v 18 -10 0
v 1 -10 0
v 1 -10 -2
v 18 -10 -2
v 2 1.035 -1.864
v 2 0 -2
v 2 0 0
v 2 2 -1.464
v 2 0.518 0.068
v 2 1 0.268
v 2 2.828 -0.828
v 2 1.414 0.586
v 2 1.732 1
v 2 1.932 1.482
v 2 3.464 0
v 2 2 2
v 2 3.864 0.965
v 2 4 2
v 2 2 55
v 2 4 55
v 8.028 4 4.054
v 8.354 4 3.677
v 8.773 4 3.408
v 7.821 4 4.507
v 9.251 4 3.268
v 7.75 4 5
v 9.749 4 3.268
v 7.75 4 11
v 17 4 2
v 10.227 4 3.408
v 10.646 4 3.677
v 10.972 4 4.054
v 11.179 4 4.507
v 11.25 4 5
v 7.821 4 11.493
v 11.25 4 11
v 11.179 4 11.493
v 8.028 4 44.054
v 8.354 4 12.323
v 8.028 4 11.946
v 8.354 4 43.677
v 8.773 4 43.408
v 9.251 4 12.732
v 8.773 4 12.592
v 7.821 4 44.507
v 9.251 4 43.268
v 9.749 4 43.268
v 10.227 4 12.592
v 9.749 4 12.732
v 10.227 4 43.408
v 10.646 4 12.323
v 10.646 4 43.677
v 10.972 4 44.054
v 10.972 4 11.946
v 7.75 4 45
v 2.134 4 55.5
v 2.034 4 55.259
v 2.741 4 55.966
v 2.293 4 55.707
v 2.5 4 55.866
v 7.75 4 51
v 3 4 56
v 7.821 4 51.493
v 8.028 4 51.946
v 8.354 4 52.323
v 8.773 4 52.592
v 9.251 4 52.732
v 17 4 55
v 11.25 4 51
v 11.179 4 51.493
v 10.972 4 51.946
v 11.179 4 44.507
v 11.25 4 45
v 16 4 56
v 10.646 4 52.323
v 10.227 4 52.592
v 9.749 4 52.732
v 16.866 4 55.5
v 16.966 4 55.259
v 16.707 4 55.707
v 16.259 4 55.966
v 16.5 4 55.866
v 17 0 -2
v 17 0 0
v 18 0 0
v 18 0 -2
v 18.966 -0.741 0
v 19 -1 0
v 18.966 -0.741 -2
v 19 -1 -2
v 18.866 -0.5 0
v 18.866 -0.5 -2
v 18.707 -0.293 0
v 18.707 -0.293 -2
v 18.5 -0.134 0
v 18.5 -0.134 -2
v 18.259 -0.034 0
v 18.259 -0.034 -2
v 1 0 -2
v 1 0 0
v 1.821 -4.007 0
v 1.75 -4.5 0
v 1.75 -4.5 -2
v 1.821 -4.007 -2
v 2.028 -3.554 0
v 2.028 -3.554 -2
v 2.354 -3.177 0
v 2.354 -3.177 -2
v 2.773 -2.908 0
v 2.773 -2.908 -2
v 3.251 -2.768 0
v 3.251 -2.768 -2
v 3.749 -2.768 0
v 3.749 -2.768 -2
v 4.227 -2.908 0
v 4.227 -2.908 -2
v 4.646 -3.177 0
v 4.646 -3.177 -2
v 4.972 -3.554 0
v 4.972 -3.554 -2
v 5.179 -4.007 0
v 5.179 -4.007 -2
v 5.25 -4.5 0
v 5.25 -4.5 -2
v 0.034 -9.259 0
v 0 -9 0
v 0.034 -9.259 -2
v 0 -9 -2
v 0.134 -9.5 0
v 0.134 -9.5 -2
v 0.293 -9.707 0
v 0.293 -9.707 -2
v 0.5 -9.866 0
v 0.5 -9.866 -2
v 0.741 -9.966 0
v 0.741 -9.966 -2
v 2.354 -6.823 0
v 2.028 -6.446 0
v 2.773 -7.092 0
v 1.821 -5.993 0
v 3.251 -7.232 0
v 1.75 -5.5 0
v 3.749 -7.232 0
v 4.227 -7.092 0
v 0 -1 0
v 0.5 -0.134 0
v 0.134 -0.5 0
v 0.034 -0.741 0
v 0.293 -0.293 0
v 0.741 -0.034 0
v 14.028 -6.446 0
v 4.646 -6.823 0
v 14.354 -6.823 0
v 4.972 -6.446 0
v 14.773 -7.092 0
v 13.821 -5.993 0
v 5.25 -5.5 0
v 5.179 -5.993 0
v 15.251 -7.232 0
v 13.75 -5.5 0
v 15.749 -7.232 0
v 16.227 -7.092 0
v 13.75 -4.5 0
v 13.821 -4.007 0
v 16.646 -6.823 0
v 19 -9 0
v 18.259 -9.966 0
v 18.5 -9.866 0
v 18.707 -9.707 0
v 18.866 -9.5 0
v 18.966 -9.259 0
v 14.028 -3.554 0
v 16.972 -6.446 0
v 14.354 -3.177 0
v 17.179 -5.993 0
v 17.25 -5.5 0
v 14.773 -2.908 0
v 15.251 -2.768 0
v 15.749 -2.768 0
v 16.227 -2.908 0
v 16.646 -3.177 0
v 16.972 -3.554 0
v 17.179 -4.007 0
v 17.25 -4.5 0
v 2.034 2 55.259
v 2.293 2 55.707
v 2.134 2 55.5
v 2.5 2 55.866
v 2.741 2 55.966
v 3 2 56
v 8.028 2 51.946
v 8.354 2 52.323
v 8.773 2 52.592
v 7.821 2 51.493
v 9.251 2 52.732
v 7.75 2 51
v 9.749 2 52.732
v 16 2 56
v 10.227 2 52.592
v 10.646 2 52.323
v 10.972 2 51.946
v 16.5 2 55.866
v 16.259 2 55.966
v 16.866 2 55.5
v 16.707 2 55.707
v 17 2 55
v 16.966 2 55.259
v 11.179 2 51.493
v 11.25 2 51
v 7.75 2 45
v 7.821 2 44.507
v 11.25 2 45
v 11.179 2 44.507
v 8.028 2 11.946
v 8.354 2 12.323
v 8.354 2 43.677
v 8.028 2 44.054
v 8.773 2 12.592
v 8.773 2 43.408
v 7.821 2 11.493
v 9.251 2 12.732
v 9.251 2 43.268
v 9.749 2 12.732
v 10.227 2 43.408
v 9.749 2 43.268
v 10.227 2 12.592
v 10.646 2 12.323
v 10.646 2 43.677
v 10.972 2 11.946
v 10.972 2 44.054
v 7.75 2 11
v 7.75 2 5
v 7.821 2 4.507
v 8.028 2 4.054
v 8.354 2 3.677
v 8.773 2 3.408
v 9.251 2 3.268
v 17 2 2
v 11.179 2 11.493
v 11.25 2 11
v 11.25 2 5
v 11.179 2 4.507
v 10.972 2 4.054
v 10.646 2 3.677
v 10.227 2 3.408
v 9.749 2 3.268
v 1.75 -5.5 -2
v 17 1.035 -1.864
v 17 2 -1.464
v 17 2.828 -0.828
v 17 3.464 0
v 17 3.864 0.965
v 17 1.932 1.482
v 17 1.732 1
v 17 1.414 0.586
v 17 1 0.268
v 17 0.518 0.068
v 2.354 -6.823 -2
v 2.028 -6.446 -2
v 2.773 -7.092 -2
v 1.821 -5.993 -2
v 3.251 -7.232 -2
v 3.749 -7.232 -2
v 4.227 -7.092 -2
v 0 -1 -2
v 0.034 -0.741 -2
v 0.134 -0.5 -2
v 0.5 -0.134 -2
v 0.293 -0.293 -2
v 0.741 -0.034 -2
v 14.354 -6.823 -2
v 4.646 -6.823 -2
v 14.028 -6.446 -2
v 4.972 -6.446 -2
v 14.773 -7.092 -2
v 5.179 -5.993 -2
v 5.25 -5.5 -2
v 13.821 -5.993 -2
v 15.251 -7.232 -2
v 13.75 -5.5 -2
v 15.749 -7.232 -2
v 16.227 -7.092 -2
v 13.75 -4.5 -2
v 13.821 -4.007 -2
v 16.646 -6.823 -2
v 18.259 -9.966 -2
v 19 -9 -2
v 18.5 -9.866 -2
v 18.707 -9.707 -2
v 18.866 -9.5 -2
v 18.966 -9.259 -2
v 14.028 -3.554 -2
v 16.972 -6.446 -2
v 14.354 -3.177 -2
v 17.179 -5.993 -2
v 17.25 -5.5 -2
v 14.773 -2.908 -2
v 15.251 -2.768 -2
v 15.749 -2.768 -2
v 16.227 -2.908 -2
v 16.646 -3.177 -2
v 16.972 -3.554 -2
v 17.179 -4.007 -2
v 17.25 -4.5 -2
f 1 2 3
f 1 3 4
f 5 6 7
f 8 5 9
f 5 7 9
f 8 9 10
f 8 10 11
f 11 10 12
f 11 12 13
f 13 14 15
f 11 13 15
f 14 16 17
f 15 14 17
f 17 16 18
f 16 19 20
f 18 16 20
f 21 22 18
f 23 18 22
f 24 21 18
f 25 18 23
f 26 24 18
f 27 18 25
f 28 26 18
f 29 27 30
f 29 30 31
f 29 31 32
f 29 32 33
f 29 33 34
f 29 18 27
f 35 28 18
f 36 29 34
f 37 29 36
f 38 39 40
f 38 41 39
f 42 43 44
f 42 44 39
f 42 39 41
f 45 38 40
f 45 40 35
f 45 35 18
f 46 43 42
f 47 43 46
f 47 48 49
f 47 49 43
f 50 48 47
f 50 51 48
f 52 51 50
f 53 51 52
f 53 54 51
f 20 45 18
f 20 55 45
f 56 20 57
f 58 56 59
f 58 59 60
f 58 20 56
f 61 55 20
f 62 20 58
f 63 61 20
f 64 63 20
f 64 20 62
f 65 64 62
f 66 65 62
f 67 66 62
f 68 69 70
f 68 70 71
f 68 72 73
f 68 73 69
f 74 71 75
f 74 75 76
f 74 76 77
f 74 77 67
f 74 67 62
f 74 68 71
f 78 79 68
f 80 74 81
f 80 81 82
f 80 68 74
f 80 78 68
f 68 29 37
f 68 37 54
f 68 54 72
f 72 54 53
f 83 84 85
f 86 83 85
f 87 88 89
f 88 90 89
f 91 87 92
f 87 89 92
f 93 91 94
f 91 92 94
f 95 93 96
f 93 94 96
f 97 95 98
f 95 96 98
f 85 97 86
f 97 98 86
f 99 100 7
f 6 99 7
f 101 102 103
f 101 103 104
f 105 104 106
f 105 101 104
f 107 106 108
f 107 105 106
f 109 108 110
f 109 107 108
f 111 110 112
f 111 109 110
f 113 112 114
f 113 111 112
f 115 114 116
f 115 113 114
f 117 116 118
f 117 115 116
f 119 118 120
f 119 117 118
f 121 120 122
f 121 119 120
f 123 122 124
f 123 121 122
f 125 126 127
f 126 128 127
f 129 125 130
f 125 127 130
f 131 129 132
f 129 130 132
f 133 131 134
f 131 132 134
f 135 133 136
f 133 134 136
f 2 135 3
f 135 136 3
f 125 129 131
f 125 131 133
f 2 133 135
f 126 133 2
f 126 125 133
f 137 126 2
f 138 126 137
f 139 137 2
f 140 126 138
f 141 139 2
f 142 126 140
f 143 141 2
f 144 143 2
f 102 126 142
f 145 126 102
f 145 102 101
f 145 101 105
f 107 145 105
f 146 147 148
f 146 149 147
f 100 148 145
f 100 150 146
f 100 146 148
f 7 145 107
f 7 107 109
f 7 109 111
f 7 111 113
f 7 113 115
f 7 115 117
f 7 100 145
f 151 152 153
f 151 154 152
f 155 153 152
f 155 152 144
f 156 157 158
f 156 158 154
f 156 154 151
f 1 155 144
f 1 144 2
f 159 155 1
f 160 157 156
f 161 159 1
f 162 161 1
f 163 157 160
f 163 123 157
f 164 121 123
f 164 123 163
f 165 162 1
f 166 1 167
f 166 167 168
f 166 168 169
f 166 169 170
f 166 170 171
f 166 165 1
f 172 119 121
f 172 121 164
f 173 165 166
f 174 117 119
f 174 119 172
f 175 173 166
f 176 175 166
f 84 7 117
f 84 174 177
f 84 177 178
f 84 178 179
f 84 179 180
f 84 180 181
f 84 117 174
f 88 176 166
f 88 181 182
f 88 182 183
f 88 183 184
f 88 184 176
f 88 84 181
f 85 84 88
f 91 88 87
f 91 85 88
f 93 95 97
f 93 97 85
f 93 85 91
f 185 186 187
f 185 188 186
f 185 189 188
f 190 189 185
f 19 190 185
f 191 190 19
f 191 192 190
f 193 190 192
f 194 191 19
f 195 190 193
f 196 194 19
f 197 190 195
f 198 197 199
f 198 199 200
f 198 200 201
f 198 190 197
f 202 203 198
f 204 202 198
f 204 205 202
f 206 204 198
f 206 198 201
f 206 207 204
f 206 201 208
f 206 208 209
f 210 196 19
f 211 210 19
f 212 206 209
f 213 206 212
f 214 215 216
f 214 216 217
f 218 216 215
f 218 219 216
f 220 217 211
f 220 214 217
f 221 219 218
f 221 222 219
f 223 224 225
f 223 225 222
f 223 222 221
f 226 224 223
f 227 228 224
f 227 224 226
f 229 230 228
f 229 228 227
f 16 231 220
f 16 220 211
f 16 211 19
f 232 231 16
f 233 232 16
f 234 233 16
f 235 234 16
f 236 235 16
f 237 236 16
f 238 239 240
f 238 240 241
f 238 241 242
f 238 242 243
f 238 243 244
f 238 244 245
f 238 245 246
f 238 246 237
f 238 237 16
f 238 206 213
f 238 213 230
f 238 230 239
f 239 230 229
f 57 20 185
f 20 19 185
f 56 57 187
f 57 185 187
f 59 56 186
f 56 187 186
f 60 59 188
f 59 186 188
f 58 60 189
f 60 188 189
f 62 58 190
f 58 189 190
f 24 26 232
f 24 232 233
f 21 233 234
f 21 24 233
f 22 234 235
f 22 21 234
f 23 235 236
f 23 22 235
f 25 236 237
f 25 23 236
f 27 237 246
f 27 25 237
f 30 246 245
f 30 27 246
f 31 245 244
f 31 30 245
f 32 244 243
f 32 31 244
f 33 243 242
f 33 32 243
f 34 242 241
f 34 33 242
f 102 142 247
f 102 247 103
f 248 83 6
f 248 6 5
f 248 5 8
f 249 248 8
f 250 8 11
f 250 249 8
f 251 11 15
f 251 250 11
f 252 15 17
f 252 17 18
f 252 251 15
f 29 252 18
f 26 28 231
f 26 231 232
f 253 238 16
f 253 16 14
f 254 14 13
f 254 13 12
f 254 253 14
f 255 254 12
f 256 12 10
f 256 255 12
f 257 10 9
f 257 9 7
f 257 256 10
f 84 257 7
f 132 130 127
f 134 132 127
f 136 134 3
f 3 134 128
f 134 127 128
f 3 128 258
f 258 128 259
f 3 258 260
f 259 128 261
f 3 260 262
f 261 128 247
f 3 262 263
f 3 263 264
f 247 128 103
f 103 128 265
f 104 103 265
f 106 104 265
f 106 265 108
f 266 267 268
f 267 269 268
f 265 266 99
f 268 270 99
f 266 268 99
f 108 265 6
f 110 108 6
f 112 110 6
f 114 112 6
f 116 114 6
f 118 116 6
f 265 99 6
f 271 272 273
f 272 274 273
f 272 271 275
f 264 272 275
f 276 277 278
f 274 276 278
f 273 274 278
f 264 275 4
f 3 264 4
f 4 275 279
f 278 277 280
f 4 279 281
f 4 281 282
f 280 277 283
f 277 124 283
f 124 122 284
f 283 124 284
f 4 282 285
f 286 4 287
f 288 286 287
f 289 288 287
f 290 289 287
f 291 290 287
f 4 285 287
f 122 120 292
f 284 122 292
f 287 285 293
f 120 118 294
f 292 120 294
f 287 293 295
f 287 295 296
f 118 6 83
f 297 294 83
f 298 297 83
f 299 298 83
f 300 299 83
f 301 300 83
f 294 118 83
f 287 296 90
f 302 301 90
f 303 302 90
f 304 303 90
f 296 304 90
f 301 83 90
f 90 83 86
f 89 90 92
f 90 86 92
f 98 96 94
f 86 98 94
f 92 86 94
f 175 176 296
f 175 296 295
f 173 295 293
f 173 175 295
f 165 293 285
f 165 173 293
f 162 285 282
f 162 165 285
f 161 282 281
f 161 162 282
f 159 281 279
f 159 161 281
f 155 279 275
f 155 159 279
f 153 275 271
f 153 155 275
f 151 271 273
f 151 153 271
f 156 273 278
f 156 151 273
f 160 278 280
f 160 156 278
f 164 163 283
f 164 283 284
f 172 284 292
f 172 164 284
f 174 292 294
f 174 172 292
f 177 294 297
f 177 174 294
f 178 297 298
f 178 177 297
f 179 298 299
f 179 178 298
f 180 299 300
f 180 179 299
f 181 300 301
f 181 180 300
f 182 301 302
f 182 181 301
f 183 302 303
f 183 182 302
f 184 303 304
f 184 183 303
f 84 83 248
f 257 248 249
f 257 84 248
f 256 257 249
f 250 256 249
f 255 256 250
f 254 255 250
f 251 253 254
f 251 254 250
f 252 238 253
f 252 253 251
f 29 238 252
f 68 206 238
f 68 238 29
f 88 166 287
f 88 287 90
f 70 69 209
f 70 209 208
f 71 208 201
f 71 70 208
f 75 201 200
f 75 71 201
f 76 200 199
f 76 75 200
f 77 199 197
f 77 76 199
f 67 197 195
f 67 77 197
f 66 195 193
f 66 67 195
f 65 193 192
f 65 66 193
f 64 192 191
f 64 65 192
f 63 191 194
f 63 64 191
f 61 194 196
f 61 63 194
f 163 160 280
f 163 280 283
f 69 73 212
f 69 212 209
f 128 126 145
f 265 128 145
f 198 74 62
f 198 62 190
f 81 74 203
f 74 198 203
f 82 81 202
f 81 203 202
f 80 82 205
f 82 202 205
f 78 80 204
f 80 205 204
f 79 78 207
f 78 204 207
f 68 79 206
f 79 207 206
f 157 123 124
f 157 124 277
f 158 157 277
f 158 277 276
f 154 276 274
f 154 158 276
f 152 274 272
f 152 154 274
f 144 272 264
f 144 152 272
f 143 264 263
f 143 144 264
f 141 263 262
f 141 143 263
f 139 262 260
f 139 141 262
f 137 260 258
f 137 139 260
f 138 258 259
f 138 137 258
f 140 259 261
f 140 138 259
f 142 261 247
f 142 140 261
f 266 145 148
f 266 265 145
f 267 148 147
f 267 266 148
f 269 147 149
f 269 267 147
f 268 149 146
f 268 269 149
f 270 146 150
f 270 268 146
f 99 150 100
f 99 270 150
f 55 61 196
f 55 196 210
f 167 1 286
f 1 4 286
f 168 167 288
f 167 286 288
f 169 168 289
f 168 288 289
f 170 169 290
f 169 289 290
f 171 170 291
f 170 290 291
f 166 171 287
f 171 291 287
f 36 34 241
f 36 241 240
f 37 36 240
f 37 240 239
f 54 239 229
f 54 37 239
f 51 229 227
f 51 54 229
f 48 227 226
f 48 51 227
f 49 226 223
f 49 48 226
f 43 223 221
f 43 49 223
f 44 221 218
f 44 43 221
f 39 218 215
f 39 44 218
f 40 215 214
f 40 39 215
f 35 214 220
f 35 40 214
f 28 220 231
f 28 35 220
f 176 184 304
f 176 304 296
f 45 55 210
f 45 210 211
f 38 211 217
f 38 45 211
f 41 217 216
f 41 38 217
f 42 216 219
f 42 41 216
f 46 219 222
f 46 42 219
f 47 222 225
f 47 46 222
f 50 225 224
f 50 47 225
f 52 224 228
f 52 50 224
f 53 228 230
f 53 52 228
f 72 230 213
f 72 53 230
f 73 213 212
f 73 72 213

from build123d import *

# Parameters (mm, degrees)
CROQUIS1_W             = 19
CROQUIS1_H             = 10
BRIDA_BASE1_DEPTH      = 2
BRIDA_DE_ARISTA1_DEPTH = 15
CORTAR_EXTRUIR1_REACH  = 62.77
REDONDEO1_R            = 1


# Sheet-metal steps are written as plain solids
with BuildPart() as part:
    # Croquis1 → Brida base1 (new body)
    with BuildSketch(Plane.XY):
        with Locations((9.5, -5)):
            Rectangle(CROQUIS1_W, CROQUIS1_H)
        with BuildLine():
            Line((5.25, -4.5), (5.25, -5.5))
            ThreePointArc((5.25, -5.5), (3.5, -7.25), (1.75, -5.5))
            Line((1.75, -5.5), (1.75, -4.5))
            ThreePointArc((1.75, -4.5), (3.5, -2.75), (5.25, -4.5))
        make_face(mode=Mode.SUBTRACT)
        with BuildLine():
            Line((17.25, -4.5), (17.25, -5.5))
            ThreePointArc((17.25, -5.5), (15.5, -7.25), (13.75, -5.5))
            Line((13.75, -5.5), (13.75, -4.5))
            ThreePointArc((13.75, -4.5), (15.5, -2.75), (17.25, -4.5))
        make_face(mode=Mode.SUBTRACT)
    extrude(amount=-BRIDA_BASE1_DEPTH)

    # Brida de arista1 section (across the edge) → Brida de arista1 (add)
    with BuildSketch(Plane(origin=(17, 2, 0), x_dir=(0, -1, 0), z_dir=(-1, 0, 0))):
        with BuildLine():
            Line((-2, 2), (-2, 56))
            Line((-2, 56), (0, 56))
            Line((0, 56), (0, 2))
            ThreePointArc((0, 2), (0.585786438, 0.585786438), (2, 0))
            Line((2, 0), (2, -2))
            ThreePointArc((2, -2), (-0.828427125, -0.828427125), (-2, 2))
        make_face()
    extrude(amount=BRIDA_DE_ARISTA1_DEPTH)

    # Croquis9 → Cortar-Extruir1 (cut, up to next)
    with BuildSketch(Plane(origin=(0, 4, 0), x_dir=(1, 0, 0), z_dir=(0, 1, 0)), mode=Mode.PRIVATE) as cortar_extruir1_sk1:
        with BuildLine():
            Line((7.75, -11), (7.75, -5))
            ThreePointArc((7.75, -5), (9.5, -3.25), (11.25, -5))
            Line((11.25, -5), (11.25, -11))
            ThreePointArc((11.25, -11), (9.5, -12.75), (7.75, -11))
        make_face()
    cortar_extruir1_tool1 = extrude(cortar_extruir1_sk1.sketch, amount=-CORTAR_EXTRUIR1_REACH, mode=Mode.PRIVATE) & part.part
    # Croquis9 → Cortar-Extruir1 (cut, up to next)
    with BuildSketch(Plane(origin=(0, 4, 0), x_dir=(1, 0, 0), z_dir=(0, 1, 0)), mode=Mode.PRIVATE) as cortar_extruir1_sk2:
        with BuildLine():
            Line((7.75, -51), (7.75, -45))
            ThreePointArc((7.75, -45), (9.5, -43.25), (11.25, -45))
            Line((11.25, -45), (11.25, -51))
            ThreePointArc((11.25, -51), (9.5, -52.75), (7.75, -51))
        make_face()
    cortar_extruir1_tool2 = extrude(cortar_extruir1_sk2.sketch, amount=-CORTAR_EXTRUIR1_REACH, mode=Mode.PRIVATE) & part.part
    add(cortar_extruir1_tool1.solids().sort_by_distance((9.5, 4, 8))[0], mode=Mode.SUBTRACT)
    add(cortar_extruir1_tool2.solids().sort_by_distance((9.5, 4, 48))[0], mode=Mode.SUBTRACT)

    # Redondeo1
    redondeo1_edges = [part.edges().sort_by_distance(p)[0] for p in [
        (17, 3, 56),
        (2, 3, 56),
        (0, 0, -1),
        (19, 0, -1),
        (19, -10, -1),
        (0, -10, -1),
    ]]
    fillet(redondeo1_edges, radius=REDONDEO1_R)


solid = part.part
